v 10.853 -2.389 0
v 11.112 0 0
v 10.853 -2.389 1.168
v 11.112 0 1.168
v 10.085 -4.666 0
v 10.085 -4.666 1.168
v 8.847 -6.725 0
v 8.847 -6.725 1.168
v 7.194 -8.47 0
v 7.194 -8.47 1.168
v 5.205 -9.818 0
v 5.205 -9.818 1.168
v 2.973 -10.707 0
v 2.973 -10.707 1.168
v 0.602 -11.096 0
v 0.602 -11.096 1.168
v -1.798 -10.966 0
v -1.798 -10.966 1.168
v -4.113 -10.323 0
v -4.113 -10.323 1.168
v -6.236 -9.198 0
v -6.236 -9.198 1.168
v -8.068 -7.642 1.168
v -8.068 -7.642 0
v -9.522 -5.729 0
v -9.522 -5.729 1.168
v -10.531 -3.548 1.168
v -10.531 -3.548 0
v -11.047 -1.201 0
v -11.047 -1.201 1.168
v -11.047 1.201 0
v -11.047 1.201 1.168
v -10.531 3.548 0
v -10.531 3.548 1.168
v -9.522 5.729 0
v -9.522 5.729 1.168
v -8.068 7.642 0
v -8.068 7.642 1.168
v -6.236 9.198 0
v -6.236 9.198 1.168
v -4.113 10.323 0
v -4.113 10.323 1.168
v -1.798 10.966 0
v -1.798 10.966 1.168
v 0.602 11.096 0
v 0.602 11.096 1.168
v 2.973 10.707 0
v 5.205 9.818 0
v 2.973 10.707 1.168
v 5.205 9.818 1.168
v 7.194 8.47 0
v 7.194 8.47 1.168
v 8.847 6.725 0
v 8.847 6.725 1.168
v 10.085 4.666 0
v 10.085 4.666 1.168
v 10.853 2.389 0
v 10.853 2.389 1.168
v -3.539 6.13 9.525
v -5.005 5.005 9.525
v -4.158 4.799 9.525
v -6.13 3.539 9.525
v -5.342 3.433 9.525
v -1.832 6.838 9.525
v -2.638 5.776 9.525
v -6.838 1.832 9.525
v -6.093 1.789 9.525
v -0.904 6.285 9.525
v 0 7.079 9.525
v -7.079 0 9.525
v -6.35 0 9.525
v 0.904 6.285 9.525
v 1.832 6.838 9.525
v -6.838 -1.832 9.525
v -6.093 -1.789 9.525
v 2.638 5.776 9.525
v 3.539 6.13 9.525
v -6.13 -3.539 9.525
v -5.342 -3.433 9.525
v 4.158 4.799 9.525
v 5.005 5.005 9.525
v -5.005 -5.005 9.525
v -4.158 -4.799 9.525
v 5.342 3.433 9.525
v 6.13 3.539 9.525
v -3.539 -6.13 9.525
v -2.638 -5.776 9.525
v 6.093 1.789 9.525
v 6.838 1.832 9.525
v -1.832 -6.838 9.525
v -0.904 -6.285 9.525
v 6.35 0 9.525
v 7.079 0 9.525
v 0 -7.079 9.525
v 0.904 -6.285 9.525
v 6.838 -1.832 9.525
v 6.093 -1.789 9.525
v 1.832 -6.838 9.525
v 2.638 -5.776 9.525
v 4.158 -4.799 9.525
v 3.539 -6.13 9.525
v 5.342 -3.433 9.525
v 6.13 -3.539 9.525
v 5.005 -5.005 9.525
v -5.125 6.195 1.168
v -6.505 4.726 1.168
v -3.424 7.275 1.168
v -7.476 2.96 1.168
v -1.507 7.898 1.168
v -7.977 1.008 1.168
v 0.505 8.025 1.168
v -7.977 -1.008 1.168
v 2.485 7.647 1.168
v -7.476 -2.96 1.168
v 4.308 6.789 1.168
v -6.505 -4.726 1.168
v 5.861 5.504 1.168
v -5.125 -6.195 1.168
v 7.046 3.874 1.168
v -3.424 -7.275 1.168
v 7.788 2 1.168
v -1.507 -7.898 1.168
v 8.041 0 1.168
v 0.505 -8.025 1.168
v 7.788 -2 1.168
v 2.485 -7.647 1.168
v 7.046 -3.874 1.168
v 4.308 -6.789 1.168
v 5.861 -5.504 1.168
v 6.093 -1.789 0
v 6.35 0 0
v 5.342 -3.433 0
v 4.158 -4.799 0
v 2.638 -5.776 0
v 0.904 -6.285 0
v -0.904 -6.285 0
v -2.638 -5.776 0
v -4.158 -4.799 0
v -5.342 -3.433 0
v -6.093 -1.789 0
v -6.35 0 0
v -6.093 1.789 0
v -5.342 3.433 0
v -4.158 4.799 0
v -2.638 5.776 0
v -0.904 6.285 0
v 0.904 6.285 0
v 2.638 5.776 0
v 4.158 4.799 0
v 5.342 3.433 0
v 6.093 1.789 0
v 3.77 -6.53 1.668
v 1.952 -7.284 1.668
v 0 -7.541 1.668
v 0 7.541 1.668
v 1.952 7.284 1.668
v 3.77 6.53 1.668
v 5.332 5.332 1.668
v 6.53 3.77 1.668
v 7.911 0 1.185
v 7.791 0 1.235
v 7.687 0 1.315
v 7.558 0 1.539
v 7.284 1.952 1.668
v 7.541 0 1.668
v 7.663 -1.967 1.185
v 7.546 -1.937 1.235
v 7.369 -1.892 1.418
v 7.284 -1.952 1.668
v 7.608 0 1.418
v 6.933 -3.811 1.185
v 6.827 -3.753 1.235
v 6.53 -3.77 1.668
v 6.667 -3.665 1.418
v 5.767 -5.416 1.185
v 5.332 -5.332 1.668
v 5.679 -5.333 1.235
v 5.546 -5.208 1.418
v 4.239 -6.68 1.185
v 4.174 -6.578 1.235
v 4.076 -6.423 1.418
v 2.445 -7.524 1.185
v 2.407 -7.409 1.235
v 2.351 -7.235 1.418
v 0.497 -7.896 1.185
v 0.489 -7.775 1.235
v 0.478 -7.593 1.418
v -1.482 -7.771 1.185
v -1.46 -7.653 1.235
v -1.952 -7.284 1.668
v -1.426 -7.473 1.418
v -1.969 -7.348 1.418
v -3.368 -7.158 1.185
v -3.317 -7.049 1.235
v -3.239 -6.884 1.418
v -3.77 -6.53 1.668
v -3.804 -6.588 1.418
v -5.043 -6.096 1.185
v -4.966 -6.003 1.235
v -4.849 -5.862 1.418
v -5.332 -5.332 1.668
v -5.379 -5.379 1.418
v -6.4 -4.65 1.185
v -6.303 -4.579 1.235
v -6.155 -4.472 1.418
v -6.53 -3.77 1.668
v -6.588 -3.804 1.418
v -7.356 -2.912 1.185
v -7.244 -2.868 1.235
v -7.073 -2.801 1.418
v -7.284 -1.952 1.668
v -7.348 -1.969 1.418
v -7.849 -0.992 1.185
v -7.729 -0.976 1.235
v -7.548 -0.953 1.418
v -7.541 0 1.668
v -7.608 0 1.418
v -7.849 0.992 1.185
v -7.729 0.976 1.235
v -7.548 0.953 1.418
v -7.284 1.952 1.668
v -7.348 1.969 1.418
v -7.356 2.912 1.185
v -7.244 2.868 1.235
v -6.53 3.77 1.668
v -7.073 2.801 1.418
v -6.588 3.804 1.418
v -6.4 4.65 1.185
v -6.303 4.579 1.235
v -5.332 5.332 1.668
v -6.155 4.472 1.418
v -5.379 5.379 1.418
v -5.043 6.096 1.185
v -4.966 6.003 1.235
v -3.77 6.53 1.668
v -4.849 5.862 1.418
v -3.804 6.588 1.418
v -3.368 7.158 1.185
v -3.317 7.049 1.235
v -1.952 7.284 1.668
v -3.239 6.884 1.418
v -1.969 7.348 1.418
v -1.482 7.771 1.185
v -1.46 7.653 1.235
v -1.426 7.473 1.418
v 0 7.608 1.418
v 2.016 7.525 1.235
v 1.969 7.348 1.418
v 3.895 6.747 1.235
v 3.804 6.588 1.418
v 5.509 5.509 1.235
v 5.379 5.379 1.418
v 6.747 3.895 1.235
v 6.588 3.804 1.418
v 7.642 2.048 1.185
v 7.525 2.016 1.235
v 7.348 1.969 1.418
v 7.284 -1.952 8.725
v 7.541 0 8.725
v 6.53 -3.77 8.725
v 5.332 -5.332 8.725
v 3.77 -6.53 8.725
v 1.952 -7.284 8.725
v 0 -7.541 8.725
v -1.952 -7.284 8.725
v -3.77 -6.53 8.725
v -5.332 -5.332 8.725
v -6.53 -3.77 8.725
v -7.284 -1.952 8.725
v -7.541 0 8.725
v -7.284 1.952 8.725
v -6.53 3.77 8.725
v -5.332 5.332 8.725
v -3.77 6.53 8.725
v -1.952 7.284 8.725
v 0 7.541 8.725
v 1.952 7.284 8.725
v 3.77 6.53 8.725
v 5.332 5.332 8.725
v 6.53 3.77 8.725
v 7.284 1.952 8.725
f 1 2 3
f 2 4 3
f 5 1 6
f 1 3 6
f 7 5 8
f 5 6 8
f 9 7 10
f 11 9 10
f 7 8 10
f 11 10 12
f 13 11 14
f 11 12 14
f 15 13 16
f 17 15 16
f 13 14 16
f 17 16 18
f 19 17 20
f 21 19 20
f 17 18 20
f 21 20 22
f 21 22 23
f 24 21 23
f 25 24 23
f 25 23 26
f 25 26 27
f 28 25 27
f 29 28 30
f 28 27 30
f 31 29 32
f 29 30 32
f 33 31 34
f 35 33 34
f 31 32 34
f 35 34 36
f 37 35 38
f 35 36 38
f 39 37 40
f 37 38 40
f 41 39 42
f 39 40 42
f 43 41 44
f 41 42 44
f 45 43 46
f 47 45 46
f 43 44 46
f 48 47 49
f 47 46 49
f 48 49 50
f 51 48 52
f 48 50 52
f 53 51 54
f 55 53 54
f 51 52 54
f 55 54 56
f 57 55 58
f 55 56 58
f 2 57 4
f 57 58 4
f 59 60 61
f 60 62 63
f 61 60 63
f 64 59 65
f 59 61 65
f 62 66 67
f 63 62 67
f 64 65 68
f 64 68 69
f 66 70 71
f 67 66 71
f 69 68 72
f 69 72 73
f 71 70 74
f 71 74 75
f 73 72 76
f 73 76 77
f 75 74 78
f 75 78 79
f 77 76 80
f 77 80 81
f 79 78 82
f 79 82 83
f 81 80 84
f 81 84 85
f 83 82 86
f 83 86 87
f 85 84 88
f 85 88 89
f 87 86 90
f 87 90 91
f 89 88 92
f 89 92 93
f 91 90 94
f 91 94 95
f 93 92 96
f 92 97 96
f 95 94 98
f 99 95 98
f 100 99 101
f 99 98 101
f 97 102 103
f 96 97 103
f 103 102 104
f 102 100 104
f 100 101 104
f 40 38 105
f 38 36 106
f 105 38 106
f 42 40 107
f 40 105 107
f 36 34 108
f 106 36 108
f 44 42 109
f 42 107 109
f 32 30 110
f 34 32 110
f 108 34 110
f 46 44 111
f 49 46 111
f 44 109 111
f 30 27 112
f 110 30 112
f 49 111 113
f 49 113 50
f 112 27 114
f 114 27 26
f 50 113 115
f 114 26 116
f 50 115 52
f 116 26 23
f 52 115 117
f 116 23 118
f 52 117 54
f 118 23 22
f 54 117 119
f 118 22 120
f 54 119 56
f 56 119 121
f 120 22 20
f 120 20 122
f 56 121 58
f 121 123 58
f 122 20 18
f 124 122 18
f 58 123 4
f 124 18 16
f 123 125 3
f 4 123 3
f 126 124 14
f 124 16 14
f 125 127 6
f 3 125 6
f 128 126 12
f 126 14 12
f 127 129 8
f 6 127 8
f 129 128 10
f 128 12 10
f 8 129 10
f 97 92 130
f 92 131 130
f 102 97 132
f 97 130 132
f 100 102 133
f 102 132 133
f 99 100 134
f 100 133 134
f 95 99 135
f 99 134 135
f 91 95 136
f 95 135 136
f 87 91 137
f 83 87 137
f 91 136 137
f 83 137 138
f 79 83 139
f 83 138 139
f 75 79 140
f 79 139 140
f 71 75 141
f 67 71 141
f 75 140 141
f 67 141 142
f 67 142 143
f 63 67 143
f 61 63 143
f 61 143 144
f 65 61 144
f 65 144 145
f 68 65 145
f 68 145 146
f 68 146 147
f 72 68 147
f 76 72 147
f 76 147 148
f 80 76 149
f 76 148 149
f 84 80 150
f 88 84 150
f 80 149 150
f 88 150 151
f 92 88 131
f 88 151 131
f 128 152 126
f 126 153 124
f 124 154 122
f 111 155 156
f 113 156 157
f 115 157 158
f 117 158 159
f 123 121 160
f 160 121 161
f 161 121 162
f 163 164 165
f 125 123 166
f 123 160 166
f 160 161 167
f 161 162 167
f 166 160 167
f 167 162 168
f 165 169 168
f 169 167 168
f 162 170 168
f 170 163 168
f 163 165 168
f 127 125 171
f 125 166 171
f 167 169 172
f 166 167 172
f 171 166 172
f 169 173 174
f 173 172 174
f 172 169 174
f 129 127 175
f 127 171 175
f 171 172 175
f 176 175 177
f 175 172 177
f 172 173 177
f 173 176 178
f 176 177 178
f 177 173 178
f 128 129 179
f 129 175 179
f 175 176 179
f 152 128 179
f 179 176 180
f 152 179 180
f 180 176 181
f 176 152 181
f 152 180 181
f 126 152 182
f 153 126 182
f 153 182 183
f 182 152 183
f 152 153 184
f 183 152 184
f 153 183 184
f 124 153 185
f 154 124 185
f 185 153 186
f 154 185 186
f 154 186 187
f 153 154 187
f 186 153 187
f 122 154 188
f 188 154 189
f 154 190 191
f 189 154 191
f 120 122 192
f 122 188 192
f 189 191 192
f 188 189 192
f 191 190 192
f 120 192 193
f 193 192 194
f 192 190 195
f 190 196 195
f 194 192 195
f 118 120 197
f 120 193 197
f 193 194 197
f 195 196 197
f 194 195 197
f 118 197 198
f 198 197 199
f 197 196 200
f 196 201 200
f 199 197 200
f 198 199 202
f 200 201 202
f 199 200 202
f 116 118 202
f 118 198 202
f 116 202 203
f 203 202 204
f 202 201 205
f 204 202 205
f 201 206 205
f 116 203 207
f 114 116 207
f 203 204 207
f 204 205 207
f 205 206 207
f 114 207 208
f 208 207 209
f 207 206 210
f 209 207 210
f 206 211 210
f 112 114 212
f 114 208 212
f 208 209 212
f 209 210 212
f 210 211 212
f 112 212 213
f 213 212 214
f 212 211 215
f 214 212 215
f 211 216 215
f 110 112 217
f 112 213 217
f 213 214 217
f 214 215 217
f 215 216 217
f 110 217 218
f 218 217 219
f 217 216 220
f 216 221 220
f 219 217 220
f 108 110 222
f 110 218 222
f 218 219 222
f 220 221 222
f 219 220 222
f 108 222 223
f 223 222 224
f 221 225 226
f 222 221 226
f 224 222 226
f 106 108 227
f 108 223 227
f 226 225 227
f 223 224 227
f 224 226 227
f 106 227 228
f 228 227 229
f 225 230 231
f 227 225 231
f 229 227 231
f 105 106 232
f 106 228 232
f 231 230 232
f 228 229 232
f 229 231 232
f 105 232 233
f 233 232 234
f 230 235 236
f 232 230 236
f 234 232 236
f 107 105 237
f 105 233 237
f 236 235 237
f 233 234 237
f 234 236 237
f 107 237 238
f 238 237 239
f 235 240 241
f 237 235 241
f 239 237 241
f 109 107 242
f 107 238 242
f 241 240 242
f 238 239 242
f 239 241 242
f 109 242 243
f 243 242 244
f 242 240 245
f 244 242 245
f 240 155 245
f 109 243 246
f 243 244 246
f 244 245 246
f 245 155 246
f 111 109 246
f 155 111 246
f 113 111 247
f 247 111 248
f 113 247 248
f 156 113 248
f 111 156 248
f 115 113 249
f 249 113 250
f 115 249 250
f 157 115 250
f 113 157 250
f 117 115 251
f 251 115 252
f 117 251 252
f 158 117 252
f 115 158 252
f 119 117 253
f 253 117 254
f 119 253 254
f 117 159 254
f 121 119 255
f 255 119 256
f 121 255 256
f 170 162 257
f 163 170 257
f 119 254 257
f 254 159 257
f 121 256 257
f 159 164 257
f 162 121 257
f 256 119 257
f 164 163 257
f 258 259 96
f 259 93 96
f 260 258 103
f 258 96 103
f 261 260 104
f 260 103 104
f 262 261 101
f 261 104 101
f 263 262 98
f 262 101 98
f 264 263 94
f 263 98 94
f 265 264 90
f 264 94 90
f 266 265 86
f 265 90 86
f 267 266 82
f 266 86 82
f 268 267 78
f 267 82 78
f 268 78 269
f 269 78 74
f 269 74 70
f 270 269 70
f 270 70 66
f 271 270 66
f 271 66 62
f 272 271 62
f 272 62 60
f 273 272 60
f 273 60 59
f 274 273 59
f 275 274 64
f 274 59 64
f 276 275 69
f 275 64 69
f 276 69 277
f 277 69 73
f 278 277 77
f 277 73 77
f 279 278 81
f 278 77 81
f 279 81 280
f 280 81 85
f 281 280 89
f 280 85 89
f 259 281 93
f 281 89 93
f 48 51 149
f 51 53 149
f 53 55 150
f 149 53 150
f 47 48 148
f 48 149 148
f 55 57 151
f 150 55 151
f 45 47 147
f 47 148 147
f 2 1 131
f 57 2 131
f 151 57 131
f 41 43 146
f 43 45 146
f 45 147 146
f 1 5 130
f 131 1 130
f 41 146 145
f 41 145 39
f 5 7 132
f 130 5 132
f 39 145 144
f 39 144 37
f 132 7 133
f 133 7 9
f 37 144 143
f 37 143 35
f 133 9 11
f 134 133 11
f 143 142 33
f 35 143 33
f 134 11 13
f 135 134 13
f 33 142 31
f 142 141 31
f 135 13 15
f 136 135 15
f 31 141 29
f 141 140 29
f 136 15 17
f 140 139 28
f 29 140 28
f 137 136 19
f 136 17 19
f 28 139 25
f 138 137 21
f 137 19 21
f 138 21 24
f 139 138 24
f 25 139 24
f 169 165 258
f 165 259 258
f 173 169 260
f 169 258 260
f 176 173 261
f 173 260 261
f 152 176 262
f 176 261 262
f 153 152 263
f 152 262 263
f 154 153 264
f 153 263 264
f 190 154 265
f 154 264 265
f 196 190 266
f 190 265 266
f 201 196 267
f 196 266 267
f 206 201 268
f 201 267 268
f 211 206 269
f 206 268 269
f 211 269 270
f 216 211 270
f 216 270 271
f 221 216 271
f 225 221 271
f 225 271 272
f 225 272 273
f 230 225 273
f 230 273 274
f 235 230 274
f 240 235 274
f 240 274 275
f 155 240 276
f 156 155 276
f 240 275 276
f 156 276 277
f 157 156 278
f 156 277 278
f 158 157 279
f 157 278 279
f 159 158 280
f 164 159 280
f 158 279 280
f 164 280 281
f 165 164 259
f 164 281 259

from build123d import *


with BuildPart() as part:
    # Sketch1 → Revolve1 (revolve)
    with BuildSketch(Plane.XZ):
        with BuildLine():
            Line((7.540625, 1.6684), (7.540625, 8.725))
            Line((7.540625, 8.725), (7.078744785, 9.525))
            Line((7.078744785, 9.525), (6.35, 9.525))
            Line((6.35, 9.525), (6.35, 0))
            Line((6.35, 0), (11.1125, 0))
            Line((11.1125, 0), (11.1125, 1.1684))
            Line((11.1125, 1.1684), (8.040625, 1.1684))
            ThreePointArc((8.040625, 1.1684), (7.687071609, 1.314846609), (7.540625, 1.6684))
        make_face()
    revolve(axis=Axis((0, 0, 9.525), (0, 0, -1)))


solid = part.part
